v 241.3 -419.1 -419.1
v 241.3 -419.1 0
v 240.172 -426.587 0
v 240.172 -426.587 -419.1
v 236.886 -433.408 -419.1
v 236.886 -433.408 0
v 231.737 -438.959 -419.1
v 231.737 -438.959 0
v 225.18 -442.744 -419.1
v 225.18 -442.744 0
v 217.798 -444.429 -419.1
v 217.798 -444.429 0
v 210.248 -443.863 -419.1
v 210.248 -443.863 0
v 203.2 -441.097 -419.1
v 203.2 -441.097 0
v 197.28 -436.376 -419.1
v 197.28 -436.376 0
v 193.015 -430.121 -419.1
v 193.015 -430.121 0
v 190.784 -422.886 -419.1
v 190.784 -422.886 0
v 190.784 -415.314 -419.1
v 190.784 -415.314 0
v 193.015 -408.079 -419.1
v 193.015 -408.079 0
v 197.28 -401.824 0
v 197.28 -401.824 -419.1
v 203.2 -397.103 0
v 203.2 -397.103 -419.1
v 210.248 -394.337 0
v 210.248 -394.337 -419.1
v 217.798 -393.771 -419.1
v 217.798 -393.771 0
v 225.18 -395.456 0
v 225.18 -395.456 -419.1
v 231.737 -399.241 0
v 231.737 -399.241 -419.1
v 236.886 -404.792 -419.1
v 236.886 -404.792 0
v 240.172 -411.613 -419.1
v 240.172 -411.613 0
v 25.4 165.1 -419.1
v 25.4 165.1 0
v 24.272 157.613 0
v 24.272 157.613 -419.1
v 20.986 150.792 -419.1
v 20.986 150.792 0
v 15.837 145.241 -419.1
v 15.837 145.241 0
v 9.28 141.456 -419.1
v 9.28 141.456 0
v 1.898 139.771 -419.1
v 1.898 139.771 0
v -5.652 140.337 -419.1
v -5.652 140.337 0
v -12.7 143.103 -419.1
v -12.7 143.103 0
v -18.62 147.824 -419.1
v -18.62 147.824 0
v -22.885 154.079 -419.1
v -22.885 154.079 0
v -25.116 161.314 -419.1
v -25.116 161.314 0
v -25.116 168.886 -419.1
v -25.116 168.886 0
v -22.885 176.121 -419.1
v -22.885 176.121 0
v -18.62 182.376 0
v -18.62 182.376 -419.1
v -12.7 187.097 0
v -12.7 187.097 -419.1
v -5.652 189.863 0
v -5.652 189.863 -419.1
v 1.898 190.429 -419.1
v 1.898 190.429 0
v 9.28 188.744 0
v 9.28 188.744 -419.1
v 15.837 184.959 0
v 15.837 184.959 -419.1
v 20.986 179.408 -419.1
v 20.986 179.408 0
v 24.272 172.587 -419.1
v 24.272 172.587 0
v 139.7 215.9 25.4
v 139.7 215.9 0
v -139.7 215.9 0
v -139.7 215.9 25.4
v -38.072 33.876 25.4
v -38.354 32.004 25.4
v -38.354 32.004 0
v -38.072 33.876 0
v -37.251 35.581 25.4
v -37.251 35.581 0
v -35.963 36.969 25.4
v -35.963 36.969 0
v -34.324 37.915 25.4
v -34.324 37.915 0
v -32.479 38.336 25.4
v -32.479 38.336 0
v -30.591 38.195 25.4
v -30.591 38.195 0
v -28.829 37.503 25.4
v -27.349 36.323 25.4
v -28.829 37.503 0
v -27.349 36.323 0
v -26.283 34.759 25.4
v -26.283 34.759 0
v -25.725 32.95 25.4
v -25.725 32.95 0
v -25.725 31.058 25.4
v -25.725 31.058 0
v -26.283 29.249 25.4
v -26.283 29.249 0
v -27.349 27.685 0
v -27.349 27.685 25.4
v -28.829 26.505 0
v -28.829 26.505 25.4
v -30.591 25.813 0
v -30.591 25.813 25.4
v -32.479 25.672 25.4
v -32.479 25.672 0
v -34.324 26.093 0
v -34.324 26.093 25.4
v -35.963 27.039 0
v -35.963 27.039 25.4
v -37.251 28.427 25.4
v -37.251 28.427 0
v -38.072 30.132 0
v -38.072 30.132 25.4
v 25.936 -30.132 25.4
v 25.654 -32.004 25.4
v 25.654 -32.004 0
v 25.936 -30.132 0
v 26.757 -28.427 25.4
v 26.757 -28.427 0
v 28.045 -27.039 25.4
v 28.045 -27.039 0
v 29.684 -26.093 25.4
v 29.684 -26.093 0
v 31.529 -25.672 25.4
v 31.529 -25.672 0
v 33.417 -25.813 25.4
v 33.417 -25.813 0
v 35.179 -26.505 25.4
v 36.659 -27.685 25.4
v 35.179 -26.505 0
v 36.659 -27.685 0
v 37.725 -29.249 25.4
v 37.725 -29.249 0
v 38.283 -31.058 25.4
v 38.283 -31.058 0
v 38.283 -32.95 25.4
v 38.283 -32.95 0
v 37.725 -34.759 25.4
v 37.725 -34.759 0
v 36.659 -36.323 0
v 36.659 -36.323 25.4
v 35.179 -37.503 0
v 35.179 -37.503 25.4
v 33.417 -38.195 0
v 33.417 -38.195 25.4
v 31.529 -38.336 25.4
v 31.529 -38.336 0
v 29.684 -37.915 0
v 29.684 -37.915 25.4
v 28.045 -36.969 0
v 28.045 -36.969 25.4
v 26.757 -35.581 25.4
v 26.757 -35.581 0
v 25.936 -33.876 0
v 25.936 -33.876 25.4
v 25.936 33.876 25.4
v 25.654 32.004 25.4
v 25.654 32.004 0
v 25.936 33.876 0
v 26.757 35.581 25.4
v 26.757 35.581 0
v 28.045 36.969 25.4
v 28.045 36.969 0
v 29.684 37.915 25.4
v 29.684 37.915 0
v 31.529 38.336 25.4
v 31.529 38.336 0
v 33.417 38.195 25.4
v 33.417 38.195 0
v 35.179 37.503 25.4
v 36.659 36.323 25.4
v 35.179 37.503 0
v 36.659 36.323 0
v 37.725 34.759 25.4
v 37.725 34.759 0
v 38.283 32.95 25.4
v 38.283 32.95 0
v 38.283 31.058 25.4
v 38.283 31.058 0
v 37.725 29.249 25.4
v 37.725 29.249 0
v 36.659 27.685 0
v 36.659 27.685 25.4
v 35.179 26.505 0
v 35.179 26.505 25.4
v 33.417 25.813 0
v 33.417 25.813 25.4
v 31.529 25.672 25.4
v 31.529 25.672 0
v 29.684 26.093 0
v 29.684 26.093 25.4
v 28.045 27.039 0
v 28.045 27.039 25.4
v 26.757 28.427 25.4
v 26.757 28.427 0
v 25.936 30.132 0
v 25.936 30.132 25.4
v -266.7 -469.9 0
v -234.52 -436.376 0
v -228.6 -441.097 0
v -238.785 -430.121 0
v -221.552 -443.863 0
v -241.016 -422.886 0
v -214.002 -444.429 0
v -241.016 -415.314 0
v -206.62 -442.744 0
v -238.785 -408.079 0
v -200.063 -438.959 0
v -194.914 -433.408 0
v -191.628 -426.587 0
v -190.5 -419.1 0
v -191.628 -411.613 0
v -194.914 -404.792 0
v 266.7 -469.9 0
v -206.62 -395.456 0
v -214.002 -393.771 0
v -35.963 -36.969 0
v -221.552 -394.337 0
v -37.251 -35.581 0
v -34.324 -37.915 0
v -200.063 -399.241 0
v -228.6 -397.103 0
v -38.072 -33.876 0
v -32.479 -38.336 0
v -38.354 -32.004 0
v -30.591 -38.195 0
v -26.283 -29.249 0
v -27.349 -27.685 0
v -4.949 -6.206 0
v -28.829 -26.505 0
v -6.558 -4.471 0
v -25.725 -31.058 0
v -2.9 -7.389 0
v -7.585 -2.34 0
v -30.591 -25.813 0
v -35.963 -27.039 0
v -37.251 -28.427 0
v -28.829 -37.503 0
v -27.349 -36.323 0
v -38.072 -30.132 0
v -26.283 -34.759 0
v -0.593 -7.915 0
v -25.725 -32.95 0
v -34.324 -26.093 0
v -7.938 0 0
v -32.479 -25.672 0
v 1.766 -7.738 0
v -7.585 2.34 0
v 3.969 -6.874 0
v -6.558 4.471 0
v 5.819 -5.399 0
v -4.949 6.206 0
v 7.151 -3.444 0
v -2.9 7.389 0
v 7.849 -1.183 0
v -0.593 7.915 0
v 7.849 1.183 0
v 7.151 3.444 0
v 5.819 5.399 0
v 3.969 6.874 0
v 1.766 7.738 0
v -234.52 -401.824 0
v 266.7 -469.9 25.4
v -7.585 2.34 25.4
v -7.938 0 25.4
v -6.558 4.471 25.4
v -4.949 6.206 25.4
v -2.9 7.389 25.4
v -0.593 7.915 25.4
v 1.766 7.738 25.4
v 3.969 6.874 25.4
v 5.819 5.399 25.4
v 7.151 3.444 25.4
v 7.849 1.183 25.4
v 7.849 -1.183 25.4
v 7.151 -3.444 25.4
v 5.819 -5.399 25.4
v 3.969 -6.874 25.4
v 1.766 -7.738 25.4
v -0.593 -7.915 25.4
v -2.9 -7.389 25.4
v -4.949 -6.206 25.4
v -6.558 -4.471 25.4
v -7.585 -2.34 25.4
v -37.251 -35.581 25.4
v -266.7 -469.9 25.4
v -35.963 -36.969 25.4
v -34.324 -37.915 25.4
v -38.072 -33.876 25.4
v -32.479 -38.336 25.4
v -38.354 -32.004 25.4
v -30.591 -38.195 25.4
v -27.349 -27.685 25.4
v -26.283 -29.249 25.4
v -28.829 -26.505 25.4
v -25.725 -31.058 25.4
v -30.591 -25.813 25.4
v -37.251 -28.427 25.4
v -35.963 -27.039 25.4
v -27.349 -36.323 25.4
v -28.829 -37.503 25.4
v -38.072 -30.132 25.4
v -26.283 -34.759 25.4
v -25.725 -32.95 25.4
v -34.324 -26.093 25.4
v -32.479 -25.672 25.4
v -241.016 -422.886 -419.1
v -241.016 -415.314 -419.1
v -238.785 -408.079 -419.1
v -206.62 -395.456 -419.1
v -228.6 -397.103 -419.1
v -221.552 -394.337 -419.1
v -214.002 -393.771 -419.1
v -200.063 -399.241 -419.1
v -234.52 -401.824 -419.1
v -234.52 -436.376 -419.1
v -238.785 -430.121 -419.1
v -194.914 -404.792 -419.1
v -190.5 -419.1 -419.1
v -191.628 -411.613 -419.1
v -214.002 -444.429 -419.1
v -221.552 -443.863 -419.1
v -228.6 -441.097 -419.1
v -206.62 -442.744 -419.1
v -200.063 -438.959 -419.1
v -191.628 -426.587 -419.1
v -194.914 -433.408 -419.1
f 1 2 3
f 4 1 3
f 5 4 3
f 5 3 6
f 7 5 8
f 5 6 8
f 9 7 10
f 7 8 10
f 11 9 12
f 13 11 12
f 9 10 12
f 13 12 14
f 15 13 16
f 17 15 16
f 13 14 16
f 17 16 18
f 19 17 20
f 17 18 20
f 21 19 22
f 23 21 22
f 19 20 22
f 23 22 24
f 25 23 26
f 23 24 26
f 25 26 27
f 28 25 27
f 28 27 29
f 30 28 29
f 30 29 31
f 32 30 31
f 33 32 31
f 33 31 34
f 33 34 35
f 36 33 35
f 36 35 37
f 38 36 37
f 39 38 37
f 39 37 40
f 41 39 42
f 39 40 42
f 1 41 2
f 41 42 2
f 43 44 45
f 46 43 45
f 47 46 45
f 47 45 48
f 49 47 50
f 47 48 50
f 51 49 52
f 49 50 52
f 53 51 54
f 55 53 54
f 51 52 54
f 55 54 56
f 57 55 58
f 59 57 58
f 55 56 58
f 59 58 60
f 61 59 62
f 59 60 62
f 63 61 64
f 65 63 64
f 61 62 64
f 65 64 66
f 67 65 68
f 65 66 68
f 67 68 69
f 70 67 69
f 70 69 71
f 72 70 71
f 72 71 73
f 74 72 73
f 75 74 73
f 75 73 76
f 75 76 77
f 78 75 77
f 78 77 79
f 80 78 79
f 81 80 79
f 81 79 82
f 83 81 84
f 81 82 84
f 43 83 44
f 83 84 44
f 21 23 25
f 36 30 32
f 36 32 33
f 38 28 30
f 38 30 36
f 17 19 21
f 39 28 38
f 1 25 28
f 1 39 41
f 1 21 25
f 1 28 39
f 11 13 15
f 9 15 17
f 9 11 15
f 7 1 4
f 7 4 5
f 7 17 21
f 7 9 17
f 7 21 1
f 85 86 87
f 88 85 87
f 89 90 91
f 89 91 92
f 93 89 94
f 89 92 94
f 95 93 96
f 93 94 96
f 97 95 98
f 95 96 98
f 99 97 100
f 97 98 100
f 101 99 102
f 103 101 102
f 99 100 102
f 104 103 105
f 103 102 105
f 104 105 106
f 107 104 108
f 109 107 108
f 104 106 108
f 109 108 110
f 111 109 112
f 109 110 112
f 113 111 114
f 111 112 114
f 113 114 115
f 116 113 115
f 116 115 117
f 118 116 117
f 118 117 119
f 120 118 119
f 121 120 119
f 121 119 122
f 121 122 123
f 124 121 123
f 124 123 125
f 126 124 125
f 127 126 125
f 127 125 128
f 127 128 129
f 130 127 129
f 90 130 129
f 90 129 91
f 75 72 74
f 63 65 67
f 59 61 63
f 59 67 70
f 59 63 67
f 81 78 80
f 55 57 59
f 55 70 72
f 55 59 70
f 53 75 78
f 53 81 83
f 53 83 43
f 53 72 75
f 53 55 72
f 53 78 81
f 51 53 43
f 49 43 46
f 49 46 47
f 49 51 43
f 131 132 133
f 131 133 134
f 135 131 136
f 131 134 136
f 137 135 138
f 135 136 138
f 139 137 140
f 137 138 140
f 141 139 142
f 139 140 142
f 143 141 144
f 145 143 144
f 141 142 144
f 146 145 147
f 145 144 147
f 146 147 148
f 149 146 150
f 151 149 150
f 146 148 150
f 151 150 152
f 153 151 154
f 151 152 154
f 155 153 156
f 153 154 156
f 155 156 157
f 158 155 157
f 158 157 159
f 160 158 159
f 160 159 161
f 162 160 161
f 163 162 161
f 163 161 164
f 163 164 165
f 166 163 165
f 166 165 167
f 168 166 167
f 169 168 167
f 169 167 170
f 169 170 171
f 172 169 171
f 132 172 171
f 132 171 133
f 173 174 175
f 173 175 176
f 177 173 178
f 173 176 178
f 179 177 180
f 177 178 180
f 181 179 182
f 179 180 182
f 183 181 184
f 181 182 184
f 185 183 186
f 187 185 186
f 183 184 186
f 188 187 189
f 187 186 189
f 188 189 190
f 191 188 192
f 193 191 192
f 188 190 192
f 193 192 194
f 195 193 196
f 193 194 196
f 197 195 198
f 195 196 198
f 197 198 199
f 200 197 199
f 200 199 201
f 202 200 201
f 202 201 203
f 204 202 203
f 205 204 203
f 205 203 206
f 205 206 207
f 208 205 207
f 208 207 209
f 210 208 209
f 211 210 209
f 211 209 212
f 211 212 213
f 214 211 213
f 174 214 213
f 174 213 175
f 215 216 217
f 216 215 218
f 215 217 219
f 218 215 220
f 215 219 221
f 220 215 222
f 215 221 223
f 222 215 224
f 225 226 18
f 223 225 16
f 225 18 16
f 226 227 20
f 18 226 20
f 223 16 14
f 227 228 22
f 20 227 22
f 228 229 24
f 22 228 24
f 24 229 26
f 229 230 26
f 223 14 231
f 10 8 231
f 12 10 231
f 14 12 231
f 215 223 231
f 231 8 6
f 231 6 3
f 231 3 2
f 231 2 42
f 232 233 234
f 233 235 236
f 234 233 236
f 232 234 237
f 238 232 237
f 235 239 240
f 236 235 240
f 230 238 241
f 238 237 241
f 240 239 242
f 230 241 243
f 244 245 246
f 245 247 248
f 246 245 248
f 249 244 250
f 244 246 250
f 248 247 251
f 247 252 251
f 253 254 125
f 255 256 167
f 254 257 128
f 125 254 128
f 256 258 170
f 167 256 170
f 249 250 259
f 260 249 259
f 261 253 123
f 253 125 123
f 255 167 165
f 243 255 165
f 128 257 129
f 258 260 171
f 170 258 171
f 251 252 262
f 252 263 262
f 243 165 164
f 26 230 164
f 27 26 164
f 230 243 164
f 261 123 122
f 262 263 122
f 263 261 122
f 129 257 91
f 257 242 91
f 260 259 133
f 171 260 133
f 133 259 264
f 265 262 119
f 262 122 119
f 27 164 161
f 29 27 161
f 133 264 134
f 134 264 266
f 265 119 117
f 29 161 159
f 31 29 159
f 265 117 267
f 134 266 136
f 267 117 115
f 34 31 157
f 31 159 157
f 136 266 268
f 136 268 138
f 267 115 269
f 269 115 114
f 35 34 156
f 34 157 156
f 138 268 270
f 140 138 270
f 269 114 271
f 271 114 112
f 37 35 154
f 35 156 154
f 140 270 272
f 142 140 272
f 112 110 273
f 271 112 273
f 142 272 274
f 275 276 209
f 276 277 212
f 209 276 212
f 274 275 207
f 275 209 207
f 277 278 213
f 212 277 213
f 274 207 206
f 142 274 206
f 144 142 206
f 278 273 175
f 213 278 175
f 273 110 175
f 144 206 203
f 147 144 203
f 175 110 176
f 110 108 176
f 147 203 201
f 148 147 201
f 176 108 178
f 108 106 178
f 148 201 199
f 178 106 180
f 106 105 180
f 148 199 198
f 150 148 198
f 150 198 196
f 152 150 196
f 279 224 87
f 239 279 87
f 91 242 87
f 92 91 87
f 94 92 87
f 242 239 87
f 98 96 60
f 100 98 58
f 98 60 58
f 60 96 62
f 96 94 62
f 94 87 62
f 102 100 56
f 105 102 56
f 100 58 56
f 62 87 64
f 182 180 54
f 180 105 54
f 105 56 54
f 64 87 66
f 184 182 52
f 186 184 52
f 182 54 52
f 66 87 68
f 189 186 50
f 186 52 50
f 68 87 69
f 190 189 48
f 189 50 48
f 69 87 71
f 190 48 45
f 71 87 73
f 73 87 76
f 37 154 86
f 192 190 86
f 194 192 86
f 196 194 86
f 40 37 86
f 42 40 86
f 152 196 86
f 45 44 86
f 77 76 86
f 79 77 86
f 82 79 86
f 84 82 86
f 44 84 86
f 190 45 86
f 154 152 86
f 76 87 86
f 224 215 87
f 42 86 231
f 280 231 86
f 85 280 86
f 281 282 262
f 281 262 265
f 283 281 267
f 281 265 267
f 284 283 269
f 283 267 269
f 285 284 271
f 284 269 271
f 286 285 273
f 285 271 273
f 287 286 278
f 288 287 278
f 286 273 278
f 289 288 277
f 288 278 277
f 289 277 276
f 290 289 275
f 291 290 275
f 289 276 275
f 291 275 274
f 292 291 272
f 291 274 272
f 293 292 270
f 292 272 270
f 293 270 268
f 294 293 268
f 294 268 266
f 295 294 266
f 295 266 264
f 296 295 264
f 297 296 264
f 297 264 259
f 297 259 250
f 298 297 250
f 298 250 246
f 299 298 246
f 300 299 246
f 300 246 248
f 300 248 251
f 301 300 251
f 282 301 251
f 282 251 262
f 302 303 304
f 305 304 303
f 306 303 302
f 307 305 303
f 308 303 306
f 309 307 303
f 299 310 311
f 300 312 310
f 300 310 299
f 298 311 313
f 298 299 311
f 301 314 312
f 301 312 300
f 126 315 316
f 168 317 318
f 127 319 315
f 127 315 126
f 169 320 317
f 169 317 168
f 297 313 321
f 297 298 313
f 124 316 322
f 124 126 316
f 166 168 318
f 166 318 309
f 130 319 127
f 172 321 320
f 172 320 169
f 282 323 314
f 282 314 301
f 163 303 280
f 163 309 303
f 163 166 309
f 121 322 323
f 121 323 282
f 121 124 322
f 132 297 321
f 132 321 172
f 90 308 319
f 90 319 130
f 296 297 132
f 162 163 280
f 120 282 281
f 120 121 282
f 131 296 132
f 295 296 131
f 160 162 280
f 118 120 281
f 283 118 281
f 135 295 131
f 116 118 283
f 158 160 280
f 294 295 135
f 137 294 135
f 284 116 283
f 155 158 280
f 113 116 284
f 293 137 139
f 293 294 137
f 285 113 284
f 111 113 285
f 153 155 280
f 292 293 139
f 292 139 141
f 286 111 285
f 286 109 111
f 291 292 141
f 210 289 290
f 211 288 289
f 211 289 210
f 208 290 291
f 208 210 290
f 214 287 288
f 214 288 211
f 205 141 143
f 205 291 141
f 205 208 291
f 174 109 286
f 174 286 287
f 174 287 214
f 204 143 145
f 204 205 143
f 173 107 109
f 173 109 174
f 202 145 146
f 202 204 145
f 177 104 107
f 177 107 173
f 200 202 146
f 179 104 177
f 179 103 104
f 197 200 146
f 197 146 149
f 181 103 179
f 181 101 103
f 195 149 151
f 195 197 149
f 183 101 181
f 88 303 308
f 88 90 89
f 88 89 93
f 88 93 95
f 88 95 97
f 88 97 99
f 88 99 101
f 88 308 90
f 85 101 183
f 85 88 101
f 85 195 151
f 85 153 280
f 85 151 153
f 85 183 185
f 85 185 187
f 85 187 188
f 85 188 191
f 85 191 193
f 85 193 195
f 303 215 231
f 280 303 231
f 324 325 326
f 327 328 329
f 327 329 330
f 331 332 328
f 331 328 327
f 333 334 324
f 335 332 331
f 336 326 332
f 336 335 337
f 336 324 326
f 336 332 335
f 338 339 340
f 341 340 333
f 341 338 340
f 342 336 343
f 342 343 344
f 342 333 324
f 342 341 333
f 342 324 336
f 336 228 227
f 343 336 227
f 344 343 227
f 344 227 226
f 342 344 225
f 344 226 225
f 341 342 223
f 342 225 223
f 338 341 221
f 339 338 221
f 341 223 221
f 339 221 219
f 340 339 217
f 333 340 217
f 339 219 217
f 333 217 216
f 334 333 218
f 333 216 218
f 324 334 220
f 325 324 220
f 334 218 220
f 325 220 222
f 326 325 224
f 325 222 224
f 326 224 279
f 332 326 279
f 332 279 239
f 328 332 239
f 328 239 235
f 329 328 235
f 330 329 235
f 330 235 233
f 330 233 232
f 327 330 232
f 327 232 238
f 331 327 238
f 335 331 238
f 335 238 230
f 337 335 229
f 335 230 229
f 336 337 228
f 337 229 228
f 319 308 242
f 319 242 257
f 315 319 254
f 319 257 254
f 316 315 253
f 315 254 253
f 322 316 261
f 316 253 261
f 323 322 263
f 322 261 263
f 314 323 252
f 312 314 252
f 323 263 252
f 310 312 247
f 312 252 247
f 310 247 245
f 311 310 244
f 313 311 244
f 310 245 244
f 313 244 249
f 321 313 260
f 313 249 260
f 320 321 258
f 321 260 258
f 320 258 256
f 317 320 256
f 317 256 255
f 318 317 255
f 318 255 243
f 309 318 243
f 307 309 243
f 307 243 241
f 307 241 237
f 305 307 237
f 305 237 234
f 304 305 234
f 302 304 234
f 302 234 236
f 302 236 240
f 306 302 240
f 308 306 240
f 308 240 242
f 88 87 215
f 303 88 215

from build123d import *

# Parameters (mm, degrees)
F1_DEPTH = 25.4
F2_R     = 25.4
F3_DEPTH = 419.1
F5_D     = 15.875
F7_D     = 12.7


with BuildPart() as f1:
    # F0 (on Top) → F1 (new body)
    with BuildSketch(Plane.XY):
        Polygon((139.7, 215.9), (0, 215.9), (-139.7, 215.9), (-266.7, -469.9), (0, -469.9), (266.7, -469.9), align=None)
    extrude(amount=F1_DEPTH)

    # F2 (on face) → F3 (join)
    with BuildSketch(Plane(origin=(0, 0, 0), x_dir=(1, 0, 0), z_dir=(0, 0, -1))):
        with Locations((-215.9, 419.1)):
            Circle(F2_R)
        with Locations((215.9, 419.1)):
            Circle(F2_R)
        with Locations((0, -165.1)):
            Circle(F2_R)
    extrude(amount=F3_DEPTH)

    # F5 (through all)
    with Locations(Plane.XY.offset(25.4)):
        with Locations((0, 0)):
            Hole(F5_D / 2)

    # F7 (through all)
    with Locations(Plane.XY.offset(25.4)):
        with Locations((32.004, -32.004), (-32.004, -32.004), (32.004, 32.004), (-32.004, 32.004)):
            Hole(F7_D / 2)


solid = f1.part
